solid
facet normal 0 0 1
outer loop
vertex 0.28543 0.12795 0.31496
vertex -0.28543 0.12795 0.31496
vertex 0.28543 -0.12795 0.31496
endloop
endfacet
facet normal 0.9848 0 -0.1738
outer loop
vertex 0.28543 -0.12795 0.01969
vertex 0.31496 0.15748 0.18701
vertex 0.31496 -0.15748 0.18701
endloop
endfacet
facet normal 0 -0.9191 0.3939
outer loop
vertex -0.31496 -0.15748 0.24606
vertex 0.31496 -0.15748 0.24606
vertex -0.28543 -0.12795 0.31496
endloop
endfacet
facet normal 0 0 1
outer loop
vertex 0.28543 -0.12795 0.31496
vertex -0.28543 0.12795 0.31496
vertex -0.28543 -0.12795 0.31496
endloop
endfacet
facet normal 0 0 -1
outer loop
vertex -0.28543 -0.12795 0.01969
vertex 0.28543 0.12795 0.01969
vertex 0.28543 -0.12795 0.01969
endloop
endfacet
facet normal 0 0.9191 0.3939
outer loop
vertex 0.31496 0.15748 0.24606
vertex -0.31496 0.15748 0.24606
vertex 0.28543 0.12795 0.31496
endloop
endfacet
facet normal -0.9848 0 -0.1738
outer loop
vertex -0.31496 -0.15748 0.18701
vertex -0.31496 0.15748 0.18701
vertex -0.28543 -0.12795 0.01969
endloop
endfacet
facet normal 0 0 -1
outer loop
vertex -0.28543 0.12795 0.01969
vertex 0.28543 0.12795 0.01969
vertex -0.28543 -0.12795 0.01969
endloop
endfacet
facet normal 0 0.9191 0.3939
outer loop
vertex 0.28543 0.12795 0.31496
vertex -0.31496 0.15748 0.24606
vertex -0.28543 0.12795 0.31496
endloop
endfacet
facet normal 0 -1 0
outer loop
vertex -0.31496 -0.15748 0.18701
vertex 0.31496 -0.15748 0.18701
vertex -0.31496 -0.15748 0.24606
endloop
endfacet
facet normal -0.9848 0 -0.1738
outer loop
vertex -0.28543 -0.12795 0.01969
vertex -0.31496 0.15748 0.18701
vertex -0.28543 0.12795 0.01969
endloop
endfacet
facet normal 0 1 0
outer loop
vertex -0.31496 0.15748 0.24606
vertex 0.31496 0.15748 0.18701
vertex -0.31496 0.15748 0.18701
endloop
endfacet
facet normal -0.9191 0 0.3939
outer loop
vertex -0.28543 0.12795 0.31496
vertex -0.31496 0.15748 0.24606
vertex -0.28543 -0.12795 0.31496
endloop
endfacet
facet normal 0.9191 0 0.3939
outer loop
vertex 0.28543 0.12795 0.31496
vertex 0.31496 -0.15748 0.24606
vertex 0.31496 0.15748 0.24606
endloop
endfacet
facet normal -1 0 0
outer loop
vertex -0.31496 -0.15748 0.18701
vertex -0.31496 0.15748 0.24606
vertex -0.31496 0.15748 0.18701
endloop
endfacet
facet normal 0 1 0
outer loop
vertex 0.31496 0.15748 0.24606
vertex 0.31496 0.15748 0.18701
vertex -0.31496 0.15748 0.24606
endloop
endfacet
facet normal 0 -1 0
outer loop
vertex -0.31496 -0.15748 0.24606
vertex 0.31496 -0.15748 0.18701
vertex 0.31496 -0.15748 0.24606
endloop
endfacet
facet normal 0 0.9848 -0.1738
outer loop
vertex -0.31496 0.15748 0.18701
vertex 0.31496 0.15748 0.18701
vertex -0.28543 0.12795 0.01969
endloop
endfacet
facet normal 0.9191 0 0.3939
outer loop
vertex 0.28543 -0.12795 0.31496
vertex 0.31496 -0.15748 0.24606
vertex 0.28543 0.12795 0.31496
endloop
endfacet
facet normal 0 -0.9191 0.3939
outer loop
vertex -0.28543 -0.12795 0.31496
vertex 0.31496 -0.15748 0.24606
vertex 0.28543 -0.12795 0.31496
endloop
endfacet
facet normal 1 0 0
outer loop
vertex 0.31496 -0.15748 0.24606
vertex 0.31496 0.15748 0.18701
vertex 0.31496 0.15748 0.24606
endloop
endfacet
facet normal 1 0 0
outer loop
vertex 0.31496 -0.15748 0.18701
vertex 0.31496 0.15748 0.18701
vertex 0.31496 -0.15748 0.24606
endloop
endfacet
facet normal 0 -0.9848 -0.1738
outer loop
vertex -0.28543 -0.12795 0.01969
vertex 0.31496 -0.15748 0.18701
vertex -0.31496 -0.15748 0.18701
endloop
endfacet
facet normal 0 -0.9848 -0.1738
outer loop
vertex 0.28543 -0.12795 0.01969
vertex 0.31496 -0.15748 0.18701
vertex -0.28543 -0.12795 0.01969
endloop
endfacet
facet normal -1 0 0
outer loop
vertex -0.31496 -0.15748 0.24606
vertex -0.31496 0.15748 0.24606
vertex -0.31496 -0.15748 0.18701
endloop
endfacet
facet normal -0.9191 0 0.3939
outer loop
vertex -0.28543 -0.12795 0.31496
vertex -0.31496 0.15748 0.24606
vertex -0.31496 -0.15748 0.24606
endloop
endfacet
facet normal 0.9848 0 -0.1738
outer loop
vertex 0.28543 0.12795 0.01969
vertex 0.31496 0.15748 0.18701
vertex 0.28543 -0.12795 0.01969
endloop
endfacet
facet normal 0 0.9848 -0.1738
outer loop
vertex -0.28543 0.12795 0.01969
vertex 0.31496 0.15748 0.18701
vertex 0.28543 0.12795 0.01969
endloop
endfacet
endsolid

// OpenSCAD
// file: defines.scad
/*Dim Min Max Typ*/
A = 0.22; // 0.15 0.30
B = 0.80; // 0.75 0.85
C = 1.60; // 1.45 1.75
D = 0.50;
G = 1.00; // 0.90 1.10
H = 1.60; // 1.50 1.70
J = 0.05; // 0.00 0.10
K = 0.75; // 0.60 0.80
L = 0.22; // 0.10 0.30
M = 0.12; // 0.10 0.20
N = 0.50; // 0.45 0.65 

scale = 1/2.54;
// main file
include <defines.scad>

an = 0.15;

/*module Label() {
  translate([0, 0, A-lab_h]) {
    linear_extrude(height = lab_h*2, center=false)
    scale(0.06)
    text("HUC7", font = font, valign="center", halign="center");
  }
}*/

module Body() {
  translate([0, 0, J]) hull() {
    translate([0, 0, K/2]) cube([H-an, B-an, K], center=true);
    translate([0, 0, N]) cube([H, B, an], center=true);
  }
  /*translate([0, 0, A1]) {
    hull(){
      translate([0, 0, A2/2]) cube([D, E1, c], center=true);
      translate([0, 0, A2/2]) cube([D-an, E1-an, A2], center=true);
    }
  }*/
}

scale(scale)
color([0.25,0.25,0.25]) {
  Body();
}
